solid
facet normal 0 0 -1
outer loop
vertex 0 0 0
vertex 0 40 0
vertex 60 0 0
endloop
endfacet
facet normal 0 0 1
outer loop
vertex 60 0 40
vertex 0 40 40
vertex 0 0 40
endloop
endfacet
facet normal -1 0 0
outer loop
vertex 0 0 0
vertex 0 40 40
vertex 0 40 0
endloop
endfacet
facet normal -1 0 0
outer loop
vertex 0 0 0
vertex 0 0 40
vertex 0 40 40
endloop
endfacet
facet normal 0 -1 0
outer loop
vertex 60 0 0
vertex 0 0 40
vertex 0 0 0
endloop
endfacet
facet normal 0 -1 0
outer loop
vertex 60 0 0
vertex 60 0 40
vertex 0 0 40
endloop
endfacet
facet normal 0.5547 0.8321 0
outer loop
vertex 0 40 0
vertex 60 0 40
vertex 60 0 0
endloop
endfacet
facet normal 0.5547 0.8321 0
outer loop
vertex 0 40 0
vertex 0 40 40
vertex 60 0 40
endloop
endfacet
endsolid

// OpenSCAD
module boltHole(){
    cylinder(r=3.5,h=23);
}
module screwHole(){
    cylinder(r=2.65,h =26);
}

module GauntletMount(){
    difference(){
        cube([80,40,13]);
        translate([20,20,0]) screwHole();
    }
}

module GauntletMountAdjust(){
    difference(){
        cube([110,40,13]);
        for(i=[20:15:105]){
            translate([i,20,0]) screwHole();
        }
    }
}

module angleBlock(a,h){
    difference(){
        rotate([0,a,0]) cube([30,40,h]);
        translate([0,0,-200]) cube(200);
        
    }
}

module lockMount(){
    difference(){
        cube([60,40,10]);
        translate([(60-12.5),20,0])boltHole();
    }
}

module lockMountAdjust(){
    difference(){
        cube([110,40,10]);
        for(i=[25:15:100]){
            translate([i,20,0]) boltHole();
        }
    }
}

//angleBlock(15,20);

module triangle(a){
    linear_extrude(height= 40) {polygon(points =[[0,0],[60,0],[0,60*tan(a)]]);
    }
}
triangle(atan(2/3));
